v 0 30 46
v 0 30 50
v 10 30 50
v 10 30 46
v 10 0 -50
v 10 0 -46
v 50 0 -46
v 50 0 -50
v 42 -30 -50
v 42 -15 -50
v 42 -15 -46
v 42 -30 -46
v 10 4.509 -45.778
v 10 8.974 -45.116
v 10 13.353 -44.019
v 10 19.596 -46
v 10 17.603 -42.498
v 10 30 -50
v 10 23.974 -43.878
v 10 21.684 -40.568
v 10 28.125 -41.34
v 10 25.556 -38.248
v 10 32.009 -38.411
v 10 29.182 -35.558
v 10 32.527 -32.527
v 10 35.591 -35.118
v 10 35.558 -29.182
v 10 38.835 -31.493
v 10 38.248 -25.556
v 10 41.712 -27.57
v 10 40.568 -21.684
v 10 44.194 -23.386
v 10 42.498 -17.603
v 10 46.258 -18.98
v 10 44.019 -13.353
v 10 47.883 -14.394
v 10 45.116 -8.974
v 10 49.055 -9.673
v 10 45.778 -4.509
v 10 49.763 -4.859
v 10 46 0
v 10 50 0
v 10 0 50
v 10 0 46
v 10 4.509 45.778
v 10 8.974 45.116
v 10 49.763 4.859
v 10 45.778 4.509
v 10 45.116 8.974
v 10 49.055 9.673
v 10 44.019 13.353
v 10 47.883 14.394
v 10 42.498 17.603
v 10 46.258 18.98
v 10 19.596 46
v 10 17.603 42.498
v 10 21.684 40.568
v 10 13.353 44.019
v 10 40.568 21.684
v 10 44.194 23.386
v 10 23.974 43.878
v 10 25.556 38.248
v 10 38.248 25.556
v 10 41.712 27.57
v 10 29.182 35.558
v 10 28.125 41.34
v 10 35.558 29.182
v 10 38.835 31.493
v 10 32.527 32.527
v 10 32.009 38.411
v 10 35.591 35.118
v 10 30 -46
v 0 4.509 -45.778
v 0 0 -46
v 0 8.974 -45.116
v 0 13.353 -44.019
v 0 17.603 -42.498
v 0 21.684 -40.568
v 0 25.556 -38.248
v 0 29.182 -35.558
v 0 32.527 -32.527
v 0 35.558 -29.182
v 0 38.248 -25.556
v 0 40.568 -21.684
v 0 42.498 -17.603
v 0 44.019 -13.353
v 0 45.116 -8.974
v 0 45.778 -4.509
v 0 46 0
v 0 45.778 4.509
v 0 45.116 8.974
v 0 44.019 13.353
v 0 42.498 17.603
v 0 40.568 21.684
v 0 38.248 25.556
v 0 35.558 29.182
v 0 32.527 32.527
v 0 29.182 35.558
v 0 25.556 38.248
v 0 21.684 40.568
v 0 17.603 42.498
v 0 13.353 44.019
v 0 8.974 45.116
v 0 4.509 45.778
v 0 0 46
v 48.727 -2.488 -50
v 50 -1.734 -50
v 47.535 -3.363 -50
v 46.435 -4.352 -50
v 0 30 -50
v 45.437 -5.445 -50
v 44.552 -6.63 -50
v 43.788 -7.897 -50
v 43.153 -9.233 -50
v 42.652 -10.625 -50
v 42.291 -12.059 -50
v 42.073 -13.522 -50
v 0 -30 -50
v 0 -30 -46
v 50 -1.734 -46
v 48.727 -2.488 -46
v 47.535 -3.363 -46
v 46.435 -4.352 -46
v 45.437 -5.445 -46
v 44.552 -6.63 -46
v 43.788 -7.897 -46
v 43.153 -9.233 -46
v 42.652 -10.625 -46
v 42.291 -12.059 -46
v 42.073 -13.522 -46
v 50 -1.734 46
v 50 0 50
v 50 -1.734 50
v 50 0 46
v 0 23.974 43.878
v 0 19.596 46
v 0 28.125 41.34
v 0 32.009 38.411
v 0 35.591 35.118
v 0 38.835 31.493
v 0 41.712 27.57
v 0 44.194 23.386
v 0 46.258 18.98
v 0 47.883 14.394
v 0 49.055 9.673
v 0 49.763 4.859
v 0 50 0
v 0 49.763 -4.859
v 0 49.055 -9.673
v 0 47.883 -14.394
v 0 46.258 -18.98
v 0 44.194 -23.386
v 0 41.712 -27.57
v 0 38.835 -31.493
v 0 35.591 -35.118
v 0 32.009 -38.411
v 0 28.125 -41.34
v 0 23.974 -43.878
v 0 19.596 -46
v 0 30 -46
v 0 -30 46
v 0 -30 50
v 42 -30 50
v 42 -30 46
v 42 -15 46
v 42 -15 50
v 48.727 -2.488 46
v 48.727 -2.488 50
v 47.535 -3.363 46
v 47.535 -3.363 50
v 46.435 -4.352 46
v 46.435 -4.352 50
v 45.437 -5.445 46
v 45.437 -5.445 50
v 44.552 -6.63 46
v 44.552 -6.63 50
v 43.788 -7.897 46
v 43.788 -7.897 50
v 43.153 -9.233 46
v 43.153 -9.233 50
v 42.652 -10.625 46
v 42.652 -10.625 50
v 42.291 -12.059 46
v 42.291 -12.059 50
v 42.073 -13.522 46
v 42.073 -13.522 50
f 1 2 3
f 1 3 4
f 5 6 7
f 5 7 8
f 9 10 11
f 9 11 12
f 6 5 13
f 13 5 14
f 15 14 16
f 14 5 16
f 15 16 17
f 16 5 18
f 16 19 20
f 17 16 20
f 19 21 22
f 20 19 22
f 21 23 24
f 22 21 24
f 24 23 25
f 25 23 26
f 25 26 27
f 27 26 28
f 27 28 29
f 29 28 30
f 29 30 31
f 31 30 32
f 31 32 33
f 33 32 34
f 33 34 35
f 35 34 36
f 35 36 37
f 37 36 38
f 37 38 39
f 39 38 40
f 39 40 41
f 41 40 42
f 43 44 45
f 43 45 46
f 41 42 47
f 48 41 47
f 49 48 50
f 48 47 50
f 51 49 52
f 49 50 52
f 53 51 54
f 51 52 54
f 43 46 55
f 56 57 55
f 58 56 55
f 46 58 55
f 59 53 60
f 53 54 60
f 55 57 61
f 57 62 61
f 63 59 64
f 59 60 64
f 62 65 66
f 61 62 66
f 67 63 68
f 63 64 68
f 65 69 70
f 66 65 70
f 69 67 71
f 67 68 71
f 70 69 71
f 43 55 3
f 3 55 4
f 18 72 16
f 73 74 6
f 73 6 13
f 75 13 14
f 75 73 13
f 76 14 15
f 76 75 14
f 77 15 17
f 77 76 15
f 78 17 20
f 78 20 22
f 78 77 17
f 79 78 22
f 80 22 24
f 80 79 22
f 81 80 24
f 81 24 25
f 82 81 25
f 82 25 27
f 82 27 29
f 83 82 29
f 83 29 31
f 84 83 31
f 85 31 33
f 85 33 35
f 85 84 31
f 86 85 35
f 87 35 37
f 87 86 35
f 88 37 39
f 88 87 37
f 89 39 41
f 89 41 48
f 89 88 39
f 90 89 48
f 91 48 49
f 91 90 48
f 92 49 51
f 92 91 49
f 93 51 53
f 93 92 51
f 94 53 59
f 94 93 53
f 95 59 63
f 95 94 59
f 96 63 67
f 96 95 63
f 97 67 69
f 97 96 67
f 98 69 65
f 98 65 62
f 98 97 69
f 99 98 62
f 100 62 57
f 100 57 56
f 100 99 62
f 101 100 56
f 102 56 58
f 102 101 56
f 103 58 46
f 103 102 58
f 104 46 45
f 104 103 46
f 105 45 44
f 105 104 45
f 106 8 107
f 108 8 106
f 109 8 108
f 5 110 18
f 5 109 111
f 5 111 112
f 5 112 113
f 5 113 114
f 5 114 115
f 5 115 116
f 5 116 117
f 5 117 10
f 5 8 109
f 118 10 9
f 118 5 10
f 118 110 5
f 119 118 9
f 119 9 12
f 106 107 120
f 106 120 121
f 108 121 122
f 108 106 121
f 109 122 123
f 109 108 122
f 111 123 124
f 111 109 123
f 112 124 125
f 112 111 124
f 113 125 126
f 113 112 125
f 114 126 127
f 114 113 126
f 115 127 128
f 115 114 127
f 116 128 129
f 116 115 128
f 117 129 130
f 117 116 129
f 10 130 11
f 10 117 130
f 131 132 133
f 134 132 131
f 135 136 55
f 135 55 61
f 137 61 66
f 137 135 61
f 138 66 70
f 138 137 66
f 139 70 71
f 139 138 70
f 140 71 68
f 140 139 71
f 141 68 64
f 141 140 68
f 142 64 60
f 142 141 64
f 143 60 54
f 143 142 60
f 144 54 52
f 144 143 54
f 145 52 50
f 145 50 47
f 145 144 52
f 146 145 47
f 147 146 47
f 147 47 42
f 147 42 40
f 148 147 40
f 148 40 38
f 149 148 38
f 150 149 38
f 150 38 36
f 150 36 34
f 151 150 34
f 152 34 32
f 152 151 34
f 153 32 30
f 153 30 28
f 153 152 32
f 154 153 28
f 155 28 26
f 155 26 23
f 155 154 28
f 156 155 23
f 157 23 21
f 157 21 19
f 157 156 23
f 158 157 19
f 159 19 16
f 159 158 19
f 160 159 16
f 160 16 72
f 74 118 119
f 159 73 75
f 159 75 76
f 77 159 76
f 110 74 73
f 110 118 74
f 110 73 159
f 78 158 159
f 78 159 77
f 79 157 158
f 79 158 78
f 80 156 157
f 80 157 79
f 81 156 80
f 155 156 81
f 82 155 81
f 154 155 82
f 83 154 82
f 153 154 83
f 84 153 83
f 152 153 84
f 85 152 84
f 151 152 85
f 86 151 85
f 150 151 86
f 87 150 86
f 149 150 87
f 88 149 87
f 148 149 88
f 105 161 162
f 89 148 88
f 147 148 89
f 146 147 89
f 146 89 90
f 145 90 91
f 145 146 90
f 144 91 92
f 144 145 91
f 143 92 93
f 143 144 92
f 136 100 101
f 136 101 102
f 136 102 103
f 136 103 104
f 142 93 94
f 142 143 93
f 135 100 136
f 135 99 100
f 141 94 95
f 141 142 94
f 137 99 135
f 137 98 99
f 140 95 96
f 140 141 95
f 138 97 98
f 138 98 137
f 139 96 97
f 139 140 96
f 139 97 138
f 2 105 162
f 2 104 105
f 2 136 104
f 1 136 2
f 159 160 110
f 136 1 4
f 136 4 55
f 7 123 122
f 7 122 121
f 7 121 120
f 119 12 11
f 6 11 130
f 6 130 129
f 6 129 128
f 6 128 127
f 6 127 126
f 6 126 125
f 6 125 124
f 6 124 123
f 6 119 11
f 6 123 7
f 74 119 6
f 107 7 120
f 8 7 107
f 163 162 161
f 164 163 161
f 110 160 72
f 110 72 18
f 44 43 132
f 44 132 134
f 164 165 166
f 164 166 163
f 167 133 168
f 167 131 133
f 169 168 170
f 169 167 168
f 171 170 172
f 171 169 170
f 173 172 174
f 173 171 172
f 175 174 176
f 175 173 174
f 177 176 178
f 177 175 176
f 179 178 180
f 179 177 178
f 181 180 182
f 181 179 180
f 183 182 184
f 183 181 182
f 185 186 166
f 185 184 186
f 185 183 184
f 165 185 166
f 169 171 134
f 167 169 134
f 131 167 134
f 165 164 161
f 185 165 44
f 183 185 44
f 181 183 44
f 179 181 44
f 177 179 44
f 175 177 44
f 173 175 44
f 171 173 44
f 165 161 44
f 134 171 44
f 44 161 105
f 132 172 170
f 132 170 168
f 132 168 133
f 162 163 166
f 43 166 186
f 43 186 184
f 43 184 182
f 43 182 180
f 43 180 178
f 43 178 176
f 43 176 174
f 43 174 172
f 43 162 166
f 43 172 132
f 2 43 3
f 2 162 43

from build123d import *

# Parameters (mm, degrees)
EXTRUDE_1_DEPTH     = 10
SKETCH_2_W          = 4
SKETCH_2_H          = 30
EXTRUDE_3_DEPTH     = 40
CUT_EXTRUDE_1_DEPTH = 123.474487139


with BuildPart() as part:
    # 草图1 → 凸台-拉伸1 (new body)
    with BuildSketch(Plane(origin=(0, 0, 0), x_dir=(0, 0, -1), z_dir=(1, 0, 0))):
        with BuildLine():
            Line((-50, 30), (-46, 30))
            Line((-46, 30), (-46, 19.595917942))
            ThreePointArc((-46, 19.595917942), (0, 50), (46, 19.595917942))
            Line((46, 19.595917942), (46, 30))
            Line((46, 30), (50, 30))
            Line((50, 30), (50, -30))
            Line((50, -30), (46, -30))
            Line((46, -30), (46, 0))
            ThreePointArc((46, 0), (0, 46), (-46, 0))
            Line((-46, 0), (-46, -30))
            Line((-46, -30), (-50, -30))
            Line((-50, -30), (-50, 30))
        make_face()
    extrude(amount=EXTRUDE_1_DEPTH)

    # 草图2 → 凸台-拉伸3 (add)
    with BuildSketch(Plane(origin=(10, 0, 0), x_dir=(0, 0, -1), z_dir=(1, 0, 0))):
        with Locations((-48, -15)):
            Rectangle(SKETCH_2_W, SKETCH_2_H)
        with Locations((48, -15)):
            Rectangle(SKETCH_2_W, SKETCH_2_H)
    extrude(amount=EXTRUDE_3_DEPTH)

    # 草图3 → 切除-拉伸1 (cut, through all)
    with BuildSketch(Plane(origin=(0, 0, -50), x_dir=(-1, 0, 0), z_dir=(0, 0, -1))):
        with BuildLine():
            Line((-42, -15), (-42, -32.28163942))
            Line((-42, -32.28163942), (-57, -32.28163942))
            Line((-57, -32.28163942), (-57, -30))
            ThreePointArc((-57, -30), (-67.606601718, -4.393398282), (-42, -15))
        make_face()
    extrude(amount=-CUT_EXTRUDE_1_DEPTH, mode=Mode.SUBTRACT)


solid = part.part
